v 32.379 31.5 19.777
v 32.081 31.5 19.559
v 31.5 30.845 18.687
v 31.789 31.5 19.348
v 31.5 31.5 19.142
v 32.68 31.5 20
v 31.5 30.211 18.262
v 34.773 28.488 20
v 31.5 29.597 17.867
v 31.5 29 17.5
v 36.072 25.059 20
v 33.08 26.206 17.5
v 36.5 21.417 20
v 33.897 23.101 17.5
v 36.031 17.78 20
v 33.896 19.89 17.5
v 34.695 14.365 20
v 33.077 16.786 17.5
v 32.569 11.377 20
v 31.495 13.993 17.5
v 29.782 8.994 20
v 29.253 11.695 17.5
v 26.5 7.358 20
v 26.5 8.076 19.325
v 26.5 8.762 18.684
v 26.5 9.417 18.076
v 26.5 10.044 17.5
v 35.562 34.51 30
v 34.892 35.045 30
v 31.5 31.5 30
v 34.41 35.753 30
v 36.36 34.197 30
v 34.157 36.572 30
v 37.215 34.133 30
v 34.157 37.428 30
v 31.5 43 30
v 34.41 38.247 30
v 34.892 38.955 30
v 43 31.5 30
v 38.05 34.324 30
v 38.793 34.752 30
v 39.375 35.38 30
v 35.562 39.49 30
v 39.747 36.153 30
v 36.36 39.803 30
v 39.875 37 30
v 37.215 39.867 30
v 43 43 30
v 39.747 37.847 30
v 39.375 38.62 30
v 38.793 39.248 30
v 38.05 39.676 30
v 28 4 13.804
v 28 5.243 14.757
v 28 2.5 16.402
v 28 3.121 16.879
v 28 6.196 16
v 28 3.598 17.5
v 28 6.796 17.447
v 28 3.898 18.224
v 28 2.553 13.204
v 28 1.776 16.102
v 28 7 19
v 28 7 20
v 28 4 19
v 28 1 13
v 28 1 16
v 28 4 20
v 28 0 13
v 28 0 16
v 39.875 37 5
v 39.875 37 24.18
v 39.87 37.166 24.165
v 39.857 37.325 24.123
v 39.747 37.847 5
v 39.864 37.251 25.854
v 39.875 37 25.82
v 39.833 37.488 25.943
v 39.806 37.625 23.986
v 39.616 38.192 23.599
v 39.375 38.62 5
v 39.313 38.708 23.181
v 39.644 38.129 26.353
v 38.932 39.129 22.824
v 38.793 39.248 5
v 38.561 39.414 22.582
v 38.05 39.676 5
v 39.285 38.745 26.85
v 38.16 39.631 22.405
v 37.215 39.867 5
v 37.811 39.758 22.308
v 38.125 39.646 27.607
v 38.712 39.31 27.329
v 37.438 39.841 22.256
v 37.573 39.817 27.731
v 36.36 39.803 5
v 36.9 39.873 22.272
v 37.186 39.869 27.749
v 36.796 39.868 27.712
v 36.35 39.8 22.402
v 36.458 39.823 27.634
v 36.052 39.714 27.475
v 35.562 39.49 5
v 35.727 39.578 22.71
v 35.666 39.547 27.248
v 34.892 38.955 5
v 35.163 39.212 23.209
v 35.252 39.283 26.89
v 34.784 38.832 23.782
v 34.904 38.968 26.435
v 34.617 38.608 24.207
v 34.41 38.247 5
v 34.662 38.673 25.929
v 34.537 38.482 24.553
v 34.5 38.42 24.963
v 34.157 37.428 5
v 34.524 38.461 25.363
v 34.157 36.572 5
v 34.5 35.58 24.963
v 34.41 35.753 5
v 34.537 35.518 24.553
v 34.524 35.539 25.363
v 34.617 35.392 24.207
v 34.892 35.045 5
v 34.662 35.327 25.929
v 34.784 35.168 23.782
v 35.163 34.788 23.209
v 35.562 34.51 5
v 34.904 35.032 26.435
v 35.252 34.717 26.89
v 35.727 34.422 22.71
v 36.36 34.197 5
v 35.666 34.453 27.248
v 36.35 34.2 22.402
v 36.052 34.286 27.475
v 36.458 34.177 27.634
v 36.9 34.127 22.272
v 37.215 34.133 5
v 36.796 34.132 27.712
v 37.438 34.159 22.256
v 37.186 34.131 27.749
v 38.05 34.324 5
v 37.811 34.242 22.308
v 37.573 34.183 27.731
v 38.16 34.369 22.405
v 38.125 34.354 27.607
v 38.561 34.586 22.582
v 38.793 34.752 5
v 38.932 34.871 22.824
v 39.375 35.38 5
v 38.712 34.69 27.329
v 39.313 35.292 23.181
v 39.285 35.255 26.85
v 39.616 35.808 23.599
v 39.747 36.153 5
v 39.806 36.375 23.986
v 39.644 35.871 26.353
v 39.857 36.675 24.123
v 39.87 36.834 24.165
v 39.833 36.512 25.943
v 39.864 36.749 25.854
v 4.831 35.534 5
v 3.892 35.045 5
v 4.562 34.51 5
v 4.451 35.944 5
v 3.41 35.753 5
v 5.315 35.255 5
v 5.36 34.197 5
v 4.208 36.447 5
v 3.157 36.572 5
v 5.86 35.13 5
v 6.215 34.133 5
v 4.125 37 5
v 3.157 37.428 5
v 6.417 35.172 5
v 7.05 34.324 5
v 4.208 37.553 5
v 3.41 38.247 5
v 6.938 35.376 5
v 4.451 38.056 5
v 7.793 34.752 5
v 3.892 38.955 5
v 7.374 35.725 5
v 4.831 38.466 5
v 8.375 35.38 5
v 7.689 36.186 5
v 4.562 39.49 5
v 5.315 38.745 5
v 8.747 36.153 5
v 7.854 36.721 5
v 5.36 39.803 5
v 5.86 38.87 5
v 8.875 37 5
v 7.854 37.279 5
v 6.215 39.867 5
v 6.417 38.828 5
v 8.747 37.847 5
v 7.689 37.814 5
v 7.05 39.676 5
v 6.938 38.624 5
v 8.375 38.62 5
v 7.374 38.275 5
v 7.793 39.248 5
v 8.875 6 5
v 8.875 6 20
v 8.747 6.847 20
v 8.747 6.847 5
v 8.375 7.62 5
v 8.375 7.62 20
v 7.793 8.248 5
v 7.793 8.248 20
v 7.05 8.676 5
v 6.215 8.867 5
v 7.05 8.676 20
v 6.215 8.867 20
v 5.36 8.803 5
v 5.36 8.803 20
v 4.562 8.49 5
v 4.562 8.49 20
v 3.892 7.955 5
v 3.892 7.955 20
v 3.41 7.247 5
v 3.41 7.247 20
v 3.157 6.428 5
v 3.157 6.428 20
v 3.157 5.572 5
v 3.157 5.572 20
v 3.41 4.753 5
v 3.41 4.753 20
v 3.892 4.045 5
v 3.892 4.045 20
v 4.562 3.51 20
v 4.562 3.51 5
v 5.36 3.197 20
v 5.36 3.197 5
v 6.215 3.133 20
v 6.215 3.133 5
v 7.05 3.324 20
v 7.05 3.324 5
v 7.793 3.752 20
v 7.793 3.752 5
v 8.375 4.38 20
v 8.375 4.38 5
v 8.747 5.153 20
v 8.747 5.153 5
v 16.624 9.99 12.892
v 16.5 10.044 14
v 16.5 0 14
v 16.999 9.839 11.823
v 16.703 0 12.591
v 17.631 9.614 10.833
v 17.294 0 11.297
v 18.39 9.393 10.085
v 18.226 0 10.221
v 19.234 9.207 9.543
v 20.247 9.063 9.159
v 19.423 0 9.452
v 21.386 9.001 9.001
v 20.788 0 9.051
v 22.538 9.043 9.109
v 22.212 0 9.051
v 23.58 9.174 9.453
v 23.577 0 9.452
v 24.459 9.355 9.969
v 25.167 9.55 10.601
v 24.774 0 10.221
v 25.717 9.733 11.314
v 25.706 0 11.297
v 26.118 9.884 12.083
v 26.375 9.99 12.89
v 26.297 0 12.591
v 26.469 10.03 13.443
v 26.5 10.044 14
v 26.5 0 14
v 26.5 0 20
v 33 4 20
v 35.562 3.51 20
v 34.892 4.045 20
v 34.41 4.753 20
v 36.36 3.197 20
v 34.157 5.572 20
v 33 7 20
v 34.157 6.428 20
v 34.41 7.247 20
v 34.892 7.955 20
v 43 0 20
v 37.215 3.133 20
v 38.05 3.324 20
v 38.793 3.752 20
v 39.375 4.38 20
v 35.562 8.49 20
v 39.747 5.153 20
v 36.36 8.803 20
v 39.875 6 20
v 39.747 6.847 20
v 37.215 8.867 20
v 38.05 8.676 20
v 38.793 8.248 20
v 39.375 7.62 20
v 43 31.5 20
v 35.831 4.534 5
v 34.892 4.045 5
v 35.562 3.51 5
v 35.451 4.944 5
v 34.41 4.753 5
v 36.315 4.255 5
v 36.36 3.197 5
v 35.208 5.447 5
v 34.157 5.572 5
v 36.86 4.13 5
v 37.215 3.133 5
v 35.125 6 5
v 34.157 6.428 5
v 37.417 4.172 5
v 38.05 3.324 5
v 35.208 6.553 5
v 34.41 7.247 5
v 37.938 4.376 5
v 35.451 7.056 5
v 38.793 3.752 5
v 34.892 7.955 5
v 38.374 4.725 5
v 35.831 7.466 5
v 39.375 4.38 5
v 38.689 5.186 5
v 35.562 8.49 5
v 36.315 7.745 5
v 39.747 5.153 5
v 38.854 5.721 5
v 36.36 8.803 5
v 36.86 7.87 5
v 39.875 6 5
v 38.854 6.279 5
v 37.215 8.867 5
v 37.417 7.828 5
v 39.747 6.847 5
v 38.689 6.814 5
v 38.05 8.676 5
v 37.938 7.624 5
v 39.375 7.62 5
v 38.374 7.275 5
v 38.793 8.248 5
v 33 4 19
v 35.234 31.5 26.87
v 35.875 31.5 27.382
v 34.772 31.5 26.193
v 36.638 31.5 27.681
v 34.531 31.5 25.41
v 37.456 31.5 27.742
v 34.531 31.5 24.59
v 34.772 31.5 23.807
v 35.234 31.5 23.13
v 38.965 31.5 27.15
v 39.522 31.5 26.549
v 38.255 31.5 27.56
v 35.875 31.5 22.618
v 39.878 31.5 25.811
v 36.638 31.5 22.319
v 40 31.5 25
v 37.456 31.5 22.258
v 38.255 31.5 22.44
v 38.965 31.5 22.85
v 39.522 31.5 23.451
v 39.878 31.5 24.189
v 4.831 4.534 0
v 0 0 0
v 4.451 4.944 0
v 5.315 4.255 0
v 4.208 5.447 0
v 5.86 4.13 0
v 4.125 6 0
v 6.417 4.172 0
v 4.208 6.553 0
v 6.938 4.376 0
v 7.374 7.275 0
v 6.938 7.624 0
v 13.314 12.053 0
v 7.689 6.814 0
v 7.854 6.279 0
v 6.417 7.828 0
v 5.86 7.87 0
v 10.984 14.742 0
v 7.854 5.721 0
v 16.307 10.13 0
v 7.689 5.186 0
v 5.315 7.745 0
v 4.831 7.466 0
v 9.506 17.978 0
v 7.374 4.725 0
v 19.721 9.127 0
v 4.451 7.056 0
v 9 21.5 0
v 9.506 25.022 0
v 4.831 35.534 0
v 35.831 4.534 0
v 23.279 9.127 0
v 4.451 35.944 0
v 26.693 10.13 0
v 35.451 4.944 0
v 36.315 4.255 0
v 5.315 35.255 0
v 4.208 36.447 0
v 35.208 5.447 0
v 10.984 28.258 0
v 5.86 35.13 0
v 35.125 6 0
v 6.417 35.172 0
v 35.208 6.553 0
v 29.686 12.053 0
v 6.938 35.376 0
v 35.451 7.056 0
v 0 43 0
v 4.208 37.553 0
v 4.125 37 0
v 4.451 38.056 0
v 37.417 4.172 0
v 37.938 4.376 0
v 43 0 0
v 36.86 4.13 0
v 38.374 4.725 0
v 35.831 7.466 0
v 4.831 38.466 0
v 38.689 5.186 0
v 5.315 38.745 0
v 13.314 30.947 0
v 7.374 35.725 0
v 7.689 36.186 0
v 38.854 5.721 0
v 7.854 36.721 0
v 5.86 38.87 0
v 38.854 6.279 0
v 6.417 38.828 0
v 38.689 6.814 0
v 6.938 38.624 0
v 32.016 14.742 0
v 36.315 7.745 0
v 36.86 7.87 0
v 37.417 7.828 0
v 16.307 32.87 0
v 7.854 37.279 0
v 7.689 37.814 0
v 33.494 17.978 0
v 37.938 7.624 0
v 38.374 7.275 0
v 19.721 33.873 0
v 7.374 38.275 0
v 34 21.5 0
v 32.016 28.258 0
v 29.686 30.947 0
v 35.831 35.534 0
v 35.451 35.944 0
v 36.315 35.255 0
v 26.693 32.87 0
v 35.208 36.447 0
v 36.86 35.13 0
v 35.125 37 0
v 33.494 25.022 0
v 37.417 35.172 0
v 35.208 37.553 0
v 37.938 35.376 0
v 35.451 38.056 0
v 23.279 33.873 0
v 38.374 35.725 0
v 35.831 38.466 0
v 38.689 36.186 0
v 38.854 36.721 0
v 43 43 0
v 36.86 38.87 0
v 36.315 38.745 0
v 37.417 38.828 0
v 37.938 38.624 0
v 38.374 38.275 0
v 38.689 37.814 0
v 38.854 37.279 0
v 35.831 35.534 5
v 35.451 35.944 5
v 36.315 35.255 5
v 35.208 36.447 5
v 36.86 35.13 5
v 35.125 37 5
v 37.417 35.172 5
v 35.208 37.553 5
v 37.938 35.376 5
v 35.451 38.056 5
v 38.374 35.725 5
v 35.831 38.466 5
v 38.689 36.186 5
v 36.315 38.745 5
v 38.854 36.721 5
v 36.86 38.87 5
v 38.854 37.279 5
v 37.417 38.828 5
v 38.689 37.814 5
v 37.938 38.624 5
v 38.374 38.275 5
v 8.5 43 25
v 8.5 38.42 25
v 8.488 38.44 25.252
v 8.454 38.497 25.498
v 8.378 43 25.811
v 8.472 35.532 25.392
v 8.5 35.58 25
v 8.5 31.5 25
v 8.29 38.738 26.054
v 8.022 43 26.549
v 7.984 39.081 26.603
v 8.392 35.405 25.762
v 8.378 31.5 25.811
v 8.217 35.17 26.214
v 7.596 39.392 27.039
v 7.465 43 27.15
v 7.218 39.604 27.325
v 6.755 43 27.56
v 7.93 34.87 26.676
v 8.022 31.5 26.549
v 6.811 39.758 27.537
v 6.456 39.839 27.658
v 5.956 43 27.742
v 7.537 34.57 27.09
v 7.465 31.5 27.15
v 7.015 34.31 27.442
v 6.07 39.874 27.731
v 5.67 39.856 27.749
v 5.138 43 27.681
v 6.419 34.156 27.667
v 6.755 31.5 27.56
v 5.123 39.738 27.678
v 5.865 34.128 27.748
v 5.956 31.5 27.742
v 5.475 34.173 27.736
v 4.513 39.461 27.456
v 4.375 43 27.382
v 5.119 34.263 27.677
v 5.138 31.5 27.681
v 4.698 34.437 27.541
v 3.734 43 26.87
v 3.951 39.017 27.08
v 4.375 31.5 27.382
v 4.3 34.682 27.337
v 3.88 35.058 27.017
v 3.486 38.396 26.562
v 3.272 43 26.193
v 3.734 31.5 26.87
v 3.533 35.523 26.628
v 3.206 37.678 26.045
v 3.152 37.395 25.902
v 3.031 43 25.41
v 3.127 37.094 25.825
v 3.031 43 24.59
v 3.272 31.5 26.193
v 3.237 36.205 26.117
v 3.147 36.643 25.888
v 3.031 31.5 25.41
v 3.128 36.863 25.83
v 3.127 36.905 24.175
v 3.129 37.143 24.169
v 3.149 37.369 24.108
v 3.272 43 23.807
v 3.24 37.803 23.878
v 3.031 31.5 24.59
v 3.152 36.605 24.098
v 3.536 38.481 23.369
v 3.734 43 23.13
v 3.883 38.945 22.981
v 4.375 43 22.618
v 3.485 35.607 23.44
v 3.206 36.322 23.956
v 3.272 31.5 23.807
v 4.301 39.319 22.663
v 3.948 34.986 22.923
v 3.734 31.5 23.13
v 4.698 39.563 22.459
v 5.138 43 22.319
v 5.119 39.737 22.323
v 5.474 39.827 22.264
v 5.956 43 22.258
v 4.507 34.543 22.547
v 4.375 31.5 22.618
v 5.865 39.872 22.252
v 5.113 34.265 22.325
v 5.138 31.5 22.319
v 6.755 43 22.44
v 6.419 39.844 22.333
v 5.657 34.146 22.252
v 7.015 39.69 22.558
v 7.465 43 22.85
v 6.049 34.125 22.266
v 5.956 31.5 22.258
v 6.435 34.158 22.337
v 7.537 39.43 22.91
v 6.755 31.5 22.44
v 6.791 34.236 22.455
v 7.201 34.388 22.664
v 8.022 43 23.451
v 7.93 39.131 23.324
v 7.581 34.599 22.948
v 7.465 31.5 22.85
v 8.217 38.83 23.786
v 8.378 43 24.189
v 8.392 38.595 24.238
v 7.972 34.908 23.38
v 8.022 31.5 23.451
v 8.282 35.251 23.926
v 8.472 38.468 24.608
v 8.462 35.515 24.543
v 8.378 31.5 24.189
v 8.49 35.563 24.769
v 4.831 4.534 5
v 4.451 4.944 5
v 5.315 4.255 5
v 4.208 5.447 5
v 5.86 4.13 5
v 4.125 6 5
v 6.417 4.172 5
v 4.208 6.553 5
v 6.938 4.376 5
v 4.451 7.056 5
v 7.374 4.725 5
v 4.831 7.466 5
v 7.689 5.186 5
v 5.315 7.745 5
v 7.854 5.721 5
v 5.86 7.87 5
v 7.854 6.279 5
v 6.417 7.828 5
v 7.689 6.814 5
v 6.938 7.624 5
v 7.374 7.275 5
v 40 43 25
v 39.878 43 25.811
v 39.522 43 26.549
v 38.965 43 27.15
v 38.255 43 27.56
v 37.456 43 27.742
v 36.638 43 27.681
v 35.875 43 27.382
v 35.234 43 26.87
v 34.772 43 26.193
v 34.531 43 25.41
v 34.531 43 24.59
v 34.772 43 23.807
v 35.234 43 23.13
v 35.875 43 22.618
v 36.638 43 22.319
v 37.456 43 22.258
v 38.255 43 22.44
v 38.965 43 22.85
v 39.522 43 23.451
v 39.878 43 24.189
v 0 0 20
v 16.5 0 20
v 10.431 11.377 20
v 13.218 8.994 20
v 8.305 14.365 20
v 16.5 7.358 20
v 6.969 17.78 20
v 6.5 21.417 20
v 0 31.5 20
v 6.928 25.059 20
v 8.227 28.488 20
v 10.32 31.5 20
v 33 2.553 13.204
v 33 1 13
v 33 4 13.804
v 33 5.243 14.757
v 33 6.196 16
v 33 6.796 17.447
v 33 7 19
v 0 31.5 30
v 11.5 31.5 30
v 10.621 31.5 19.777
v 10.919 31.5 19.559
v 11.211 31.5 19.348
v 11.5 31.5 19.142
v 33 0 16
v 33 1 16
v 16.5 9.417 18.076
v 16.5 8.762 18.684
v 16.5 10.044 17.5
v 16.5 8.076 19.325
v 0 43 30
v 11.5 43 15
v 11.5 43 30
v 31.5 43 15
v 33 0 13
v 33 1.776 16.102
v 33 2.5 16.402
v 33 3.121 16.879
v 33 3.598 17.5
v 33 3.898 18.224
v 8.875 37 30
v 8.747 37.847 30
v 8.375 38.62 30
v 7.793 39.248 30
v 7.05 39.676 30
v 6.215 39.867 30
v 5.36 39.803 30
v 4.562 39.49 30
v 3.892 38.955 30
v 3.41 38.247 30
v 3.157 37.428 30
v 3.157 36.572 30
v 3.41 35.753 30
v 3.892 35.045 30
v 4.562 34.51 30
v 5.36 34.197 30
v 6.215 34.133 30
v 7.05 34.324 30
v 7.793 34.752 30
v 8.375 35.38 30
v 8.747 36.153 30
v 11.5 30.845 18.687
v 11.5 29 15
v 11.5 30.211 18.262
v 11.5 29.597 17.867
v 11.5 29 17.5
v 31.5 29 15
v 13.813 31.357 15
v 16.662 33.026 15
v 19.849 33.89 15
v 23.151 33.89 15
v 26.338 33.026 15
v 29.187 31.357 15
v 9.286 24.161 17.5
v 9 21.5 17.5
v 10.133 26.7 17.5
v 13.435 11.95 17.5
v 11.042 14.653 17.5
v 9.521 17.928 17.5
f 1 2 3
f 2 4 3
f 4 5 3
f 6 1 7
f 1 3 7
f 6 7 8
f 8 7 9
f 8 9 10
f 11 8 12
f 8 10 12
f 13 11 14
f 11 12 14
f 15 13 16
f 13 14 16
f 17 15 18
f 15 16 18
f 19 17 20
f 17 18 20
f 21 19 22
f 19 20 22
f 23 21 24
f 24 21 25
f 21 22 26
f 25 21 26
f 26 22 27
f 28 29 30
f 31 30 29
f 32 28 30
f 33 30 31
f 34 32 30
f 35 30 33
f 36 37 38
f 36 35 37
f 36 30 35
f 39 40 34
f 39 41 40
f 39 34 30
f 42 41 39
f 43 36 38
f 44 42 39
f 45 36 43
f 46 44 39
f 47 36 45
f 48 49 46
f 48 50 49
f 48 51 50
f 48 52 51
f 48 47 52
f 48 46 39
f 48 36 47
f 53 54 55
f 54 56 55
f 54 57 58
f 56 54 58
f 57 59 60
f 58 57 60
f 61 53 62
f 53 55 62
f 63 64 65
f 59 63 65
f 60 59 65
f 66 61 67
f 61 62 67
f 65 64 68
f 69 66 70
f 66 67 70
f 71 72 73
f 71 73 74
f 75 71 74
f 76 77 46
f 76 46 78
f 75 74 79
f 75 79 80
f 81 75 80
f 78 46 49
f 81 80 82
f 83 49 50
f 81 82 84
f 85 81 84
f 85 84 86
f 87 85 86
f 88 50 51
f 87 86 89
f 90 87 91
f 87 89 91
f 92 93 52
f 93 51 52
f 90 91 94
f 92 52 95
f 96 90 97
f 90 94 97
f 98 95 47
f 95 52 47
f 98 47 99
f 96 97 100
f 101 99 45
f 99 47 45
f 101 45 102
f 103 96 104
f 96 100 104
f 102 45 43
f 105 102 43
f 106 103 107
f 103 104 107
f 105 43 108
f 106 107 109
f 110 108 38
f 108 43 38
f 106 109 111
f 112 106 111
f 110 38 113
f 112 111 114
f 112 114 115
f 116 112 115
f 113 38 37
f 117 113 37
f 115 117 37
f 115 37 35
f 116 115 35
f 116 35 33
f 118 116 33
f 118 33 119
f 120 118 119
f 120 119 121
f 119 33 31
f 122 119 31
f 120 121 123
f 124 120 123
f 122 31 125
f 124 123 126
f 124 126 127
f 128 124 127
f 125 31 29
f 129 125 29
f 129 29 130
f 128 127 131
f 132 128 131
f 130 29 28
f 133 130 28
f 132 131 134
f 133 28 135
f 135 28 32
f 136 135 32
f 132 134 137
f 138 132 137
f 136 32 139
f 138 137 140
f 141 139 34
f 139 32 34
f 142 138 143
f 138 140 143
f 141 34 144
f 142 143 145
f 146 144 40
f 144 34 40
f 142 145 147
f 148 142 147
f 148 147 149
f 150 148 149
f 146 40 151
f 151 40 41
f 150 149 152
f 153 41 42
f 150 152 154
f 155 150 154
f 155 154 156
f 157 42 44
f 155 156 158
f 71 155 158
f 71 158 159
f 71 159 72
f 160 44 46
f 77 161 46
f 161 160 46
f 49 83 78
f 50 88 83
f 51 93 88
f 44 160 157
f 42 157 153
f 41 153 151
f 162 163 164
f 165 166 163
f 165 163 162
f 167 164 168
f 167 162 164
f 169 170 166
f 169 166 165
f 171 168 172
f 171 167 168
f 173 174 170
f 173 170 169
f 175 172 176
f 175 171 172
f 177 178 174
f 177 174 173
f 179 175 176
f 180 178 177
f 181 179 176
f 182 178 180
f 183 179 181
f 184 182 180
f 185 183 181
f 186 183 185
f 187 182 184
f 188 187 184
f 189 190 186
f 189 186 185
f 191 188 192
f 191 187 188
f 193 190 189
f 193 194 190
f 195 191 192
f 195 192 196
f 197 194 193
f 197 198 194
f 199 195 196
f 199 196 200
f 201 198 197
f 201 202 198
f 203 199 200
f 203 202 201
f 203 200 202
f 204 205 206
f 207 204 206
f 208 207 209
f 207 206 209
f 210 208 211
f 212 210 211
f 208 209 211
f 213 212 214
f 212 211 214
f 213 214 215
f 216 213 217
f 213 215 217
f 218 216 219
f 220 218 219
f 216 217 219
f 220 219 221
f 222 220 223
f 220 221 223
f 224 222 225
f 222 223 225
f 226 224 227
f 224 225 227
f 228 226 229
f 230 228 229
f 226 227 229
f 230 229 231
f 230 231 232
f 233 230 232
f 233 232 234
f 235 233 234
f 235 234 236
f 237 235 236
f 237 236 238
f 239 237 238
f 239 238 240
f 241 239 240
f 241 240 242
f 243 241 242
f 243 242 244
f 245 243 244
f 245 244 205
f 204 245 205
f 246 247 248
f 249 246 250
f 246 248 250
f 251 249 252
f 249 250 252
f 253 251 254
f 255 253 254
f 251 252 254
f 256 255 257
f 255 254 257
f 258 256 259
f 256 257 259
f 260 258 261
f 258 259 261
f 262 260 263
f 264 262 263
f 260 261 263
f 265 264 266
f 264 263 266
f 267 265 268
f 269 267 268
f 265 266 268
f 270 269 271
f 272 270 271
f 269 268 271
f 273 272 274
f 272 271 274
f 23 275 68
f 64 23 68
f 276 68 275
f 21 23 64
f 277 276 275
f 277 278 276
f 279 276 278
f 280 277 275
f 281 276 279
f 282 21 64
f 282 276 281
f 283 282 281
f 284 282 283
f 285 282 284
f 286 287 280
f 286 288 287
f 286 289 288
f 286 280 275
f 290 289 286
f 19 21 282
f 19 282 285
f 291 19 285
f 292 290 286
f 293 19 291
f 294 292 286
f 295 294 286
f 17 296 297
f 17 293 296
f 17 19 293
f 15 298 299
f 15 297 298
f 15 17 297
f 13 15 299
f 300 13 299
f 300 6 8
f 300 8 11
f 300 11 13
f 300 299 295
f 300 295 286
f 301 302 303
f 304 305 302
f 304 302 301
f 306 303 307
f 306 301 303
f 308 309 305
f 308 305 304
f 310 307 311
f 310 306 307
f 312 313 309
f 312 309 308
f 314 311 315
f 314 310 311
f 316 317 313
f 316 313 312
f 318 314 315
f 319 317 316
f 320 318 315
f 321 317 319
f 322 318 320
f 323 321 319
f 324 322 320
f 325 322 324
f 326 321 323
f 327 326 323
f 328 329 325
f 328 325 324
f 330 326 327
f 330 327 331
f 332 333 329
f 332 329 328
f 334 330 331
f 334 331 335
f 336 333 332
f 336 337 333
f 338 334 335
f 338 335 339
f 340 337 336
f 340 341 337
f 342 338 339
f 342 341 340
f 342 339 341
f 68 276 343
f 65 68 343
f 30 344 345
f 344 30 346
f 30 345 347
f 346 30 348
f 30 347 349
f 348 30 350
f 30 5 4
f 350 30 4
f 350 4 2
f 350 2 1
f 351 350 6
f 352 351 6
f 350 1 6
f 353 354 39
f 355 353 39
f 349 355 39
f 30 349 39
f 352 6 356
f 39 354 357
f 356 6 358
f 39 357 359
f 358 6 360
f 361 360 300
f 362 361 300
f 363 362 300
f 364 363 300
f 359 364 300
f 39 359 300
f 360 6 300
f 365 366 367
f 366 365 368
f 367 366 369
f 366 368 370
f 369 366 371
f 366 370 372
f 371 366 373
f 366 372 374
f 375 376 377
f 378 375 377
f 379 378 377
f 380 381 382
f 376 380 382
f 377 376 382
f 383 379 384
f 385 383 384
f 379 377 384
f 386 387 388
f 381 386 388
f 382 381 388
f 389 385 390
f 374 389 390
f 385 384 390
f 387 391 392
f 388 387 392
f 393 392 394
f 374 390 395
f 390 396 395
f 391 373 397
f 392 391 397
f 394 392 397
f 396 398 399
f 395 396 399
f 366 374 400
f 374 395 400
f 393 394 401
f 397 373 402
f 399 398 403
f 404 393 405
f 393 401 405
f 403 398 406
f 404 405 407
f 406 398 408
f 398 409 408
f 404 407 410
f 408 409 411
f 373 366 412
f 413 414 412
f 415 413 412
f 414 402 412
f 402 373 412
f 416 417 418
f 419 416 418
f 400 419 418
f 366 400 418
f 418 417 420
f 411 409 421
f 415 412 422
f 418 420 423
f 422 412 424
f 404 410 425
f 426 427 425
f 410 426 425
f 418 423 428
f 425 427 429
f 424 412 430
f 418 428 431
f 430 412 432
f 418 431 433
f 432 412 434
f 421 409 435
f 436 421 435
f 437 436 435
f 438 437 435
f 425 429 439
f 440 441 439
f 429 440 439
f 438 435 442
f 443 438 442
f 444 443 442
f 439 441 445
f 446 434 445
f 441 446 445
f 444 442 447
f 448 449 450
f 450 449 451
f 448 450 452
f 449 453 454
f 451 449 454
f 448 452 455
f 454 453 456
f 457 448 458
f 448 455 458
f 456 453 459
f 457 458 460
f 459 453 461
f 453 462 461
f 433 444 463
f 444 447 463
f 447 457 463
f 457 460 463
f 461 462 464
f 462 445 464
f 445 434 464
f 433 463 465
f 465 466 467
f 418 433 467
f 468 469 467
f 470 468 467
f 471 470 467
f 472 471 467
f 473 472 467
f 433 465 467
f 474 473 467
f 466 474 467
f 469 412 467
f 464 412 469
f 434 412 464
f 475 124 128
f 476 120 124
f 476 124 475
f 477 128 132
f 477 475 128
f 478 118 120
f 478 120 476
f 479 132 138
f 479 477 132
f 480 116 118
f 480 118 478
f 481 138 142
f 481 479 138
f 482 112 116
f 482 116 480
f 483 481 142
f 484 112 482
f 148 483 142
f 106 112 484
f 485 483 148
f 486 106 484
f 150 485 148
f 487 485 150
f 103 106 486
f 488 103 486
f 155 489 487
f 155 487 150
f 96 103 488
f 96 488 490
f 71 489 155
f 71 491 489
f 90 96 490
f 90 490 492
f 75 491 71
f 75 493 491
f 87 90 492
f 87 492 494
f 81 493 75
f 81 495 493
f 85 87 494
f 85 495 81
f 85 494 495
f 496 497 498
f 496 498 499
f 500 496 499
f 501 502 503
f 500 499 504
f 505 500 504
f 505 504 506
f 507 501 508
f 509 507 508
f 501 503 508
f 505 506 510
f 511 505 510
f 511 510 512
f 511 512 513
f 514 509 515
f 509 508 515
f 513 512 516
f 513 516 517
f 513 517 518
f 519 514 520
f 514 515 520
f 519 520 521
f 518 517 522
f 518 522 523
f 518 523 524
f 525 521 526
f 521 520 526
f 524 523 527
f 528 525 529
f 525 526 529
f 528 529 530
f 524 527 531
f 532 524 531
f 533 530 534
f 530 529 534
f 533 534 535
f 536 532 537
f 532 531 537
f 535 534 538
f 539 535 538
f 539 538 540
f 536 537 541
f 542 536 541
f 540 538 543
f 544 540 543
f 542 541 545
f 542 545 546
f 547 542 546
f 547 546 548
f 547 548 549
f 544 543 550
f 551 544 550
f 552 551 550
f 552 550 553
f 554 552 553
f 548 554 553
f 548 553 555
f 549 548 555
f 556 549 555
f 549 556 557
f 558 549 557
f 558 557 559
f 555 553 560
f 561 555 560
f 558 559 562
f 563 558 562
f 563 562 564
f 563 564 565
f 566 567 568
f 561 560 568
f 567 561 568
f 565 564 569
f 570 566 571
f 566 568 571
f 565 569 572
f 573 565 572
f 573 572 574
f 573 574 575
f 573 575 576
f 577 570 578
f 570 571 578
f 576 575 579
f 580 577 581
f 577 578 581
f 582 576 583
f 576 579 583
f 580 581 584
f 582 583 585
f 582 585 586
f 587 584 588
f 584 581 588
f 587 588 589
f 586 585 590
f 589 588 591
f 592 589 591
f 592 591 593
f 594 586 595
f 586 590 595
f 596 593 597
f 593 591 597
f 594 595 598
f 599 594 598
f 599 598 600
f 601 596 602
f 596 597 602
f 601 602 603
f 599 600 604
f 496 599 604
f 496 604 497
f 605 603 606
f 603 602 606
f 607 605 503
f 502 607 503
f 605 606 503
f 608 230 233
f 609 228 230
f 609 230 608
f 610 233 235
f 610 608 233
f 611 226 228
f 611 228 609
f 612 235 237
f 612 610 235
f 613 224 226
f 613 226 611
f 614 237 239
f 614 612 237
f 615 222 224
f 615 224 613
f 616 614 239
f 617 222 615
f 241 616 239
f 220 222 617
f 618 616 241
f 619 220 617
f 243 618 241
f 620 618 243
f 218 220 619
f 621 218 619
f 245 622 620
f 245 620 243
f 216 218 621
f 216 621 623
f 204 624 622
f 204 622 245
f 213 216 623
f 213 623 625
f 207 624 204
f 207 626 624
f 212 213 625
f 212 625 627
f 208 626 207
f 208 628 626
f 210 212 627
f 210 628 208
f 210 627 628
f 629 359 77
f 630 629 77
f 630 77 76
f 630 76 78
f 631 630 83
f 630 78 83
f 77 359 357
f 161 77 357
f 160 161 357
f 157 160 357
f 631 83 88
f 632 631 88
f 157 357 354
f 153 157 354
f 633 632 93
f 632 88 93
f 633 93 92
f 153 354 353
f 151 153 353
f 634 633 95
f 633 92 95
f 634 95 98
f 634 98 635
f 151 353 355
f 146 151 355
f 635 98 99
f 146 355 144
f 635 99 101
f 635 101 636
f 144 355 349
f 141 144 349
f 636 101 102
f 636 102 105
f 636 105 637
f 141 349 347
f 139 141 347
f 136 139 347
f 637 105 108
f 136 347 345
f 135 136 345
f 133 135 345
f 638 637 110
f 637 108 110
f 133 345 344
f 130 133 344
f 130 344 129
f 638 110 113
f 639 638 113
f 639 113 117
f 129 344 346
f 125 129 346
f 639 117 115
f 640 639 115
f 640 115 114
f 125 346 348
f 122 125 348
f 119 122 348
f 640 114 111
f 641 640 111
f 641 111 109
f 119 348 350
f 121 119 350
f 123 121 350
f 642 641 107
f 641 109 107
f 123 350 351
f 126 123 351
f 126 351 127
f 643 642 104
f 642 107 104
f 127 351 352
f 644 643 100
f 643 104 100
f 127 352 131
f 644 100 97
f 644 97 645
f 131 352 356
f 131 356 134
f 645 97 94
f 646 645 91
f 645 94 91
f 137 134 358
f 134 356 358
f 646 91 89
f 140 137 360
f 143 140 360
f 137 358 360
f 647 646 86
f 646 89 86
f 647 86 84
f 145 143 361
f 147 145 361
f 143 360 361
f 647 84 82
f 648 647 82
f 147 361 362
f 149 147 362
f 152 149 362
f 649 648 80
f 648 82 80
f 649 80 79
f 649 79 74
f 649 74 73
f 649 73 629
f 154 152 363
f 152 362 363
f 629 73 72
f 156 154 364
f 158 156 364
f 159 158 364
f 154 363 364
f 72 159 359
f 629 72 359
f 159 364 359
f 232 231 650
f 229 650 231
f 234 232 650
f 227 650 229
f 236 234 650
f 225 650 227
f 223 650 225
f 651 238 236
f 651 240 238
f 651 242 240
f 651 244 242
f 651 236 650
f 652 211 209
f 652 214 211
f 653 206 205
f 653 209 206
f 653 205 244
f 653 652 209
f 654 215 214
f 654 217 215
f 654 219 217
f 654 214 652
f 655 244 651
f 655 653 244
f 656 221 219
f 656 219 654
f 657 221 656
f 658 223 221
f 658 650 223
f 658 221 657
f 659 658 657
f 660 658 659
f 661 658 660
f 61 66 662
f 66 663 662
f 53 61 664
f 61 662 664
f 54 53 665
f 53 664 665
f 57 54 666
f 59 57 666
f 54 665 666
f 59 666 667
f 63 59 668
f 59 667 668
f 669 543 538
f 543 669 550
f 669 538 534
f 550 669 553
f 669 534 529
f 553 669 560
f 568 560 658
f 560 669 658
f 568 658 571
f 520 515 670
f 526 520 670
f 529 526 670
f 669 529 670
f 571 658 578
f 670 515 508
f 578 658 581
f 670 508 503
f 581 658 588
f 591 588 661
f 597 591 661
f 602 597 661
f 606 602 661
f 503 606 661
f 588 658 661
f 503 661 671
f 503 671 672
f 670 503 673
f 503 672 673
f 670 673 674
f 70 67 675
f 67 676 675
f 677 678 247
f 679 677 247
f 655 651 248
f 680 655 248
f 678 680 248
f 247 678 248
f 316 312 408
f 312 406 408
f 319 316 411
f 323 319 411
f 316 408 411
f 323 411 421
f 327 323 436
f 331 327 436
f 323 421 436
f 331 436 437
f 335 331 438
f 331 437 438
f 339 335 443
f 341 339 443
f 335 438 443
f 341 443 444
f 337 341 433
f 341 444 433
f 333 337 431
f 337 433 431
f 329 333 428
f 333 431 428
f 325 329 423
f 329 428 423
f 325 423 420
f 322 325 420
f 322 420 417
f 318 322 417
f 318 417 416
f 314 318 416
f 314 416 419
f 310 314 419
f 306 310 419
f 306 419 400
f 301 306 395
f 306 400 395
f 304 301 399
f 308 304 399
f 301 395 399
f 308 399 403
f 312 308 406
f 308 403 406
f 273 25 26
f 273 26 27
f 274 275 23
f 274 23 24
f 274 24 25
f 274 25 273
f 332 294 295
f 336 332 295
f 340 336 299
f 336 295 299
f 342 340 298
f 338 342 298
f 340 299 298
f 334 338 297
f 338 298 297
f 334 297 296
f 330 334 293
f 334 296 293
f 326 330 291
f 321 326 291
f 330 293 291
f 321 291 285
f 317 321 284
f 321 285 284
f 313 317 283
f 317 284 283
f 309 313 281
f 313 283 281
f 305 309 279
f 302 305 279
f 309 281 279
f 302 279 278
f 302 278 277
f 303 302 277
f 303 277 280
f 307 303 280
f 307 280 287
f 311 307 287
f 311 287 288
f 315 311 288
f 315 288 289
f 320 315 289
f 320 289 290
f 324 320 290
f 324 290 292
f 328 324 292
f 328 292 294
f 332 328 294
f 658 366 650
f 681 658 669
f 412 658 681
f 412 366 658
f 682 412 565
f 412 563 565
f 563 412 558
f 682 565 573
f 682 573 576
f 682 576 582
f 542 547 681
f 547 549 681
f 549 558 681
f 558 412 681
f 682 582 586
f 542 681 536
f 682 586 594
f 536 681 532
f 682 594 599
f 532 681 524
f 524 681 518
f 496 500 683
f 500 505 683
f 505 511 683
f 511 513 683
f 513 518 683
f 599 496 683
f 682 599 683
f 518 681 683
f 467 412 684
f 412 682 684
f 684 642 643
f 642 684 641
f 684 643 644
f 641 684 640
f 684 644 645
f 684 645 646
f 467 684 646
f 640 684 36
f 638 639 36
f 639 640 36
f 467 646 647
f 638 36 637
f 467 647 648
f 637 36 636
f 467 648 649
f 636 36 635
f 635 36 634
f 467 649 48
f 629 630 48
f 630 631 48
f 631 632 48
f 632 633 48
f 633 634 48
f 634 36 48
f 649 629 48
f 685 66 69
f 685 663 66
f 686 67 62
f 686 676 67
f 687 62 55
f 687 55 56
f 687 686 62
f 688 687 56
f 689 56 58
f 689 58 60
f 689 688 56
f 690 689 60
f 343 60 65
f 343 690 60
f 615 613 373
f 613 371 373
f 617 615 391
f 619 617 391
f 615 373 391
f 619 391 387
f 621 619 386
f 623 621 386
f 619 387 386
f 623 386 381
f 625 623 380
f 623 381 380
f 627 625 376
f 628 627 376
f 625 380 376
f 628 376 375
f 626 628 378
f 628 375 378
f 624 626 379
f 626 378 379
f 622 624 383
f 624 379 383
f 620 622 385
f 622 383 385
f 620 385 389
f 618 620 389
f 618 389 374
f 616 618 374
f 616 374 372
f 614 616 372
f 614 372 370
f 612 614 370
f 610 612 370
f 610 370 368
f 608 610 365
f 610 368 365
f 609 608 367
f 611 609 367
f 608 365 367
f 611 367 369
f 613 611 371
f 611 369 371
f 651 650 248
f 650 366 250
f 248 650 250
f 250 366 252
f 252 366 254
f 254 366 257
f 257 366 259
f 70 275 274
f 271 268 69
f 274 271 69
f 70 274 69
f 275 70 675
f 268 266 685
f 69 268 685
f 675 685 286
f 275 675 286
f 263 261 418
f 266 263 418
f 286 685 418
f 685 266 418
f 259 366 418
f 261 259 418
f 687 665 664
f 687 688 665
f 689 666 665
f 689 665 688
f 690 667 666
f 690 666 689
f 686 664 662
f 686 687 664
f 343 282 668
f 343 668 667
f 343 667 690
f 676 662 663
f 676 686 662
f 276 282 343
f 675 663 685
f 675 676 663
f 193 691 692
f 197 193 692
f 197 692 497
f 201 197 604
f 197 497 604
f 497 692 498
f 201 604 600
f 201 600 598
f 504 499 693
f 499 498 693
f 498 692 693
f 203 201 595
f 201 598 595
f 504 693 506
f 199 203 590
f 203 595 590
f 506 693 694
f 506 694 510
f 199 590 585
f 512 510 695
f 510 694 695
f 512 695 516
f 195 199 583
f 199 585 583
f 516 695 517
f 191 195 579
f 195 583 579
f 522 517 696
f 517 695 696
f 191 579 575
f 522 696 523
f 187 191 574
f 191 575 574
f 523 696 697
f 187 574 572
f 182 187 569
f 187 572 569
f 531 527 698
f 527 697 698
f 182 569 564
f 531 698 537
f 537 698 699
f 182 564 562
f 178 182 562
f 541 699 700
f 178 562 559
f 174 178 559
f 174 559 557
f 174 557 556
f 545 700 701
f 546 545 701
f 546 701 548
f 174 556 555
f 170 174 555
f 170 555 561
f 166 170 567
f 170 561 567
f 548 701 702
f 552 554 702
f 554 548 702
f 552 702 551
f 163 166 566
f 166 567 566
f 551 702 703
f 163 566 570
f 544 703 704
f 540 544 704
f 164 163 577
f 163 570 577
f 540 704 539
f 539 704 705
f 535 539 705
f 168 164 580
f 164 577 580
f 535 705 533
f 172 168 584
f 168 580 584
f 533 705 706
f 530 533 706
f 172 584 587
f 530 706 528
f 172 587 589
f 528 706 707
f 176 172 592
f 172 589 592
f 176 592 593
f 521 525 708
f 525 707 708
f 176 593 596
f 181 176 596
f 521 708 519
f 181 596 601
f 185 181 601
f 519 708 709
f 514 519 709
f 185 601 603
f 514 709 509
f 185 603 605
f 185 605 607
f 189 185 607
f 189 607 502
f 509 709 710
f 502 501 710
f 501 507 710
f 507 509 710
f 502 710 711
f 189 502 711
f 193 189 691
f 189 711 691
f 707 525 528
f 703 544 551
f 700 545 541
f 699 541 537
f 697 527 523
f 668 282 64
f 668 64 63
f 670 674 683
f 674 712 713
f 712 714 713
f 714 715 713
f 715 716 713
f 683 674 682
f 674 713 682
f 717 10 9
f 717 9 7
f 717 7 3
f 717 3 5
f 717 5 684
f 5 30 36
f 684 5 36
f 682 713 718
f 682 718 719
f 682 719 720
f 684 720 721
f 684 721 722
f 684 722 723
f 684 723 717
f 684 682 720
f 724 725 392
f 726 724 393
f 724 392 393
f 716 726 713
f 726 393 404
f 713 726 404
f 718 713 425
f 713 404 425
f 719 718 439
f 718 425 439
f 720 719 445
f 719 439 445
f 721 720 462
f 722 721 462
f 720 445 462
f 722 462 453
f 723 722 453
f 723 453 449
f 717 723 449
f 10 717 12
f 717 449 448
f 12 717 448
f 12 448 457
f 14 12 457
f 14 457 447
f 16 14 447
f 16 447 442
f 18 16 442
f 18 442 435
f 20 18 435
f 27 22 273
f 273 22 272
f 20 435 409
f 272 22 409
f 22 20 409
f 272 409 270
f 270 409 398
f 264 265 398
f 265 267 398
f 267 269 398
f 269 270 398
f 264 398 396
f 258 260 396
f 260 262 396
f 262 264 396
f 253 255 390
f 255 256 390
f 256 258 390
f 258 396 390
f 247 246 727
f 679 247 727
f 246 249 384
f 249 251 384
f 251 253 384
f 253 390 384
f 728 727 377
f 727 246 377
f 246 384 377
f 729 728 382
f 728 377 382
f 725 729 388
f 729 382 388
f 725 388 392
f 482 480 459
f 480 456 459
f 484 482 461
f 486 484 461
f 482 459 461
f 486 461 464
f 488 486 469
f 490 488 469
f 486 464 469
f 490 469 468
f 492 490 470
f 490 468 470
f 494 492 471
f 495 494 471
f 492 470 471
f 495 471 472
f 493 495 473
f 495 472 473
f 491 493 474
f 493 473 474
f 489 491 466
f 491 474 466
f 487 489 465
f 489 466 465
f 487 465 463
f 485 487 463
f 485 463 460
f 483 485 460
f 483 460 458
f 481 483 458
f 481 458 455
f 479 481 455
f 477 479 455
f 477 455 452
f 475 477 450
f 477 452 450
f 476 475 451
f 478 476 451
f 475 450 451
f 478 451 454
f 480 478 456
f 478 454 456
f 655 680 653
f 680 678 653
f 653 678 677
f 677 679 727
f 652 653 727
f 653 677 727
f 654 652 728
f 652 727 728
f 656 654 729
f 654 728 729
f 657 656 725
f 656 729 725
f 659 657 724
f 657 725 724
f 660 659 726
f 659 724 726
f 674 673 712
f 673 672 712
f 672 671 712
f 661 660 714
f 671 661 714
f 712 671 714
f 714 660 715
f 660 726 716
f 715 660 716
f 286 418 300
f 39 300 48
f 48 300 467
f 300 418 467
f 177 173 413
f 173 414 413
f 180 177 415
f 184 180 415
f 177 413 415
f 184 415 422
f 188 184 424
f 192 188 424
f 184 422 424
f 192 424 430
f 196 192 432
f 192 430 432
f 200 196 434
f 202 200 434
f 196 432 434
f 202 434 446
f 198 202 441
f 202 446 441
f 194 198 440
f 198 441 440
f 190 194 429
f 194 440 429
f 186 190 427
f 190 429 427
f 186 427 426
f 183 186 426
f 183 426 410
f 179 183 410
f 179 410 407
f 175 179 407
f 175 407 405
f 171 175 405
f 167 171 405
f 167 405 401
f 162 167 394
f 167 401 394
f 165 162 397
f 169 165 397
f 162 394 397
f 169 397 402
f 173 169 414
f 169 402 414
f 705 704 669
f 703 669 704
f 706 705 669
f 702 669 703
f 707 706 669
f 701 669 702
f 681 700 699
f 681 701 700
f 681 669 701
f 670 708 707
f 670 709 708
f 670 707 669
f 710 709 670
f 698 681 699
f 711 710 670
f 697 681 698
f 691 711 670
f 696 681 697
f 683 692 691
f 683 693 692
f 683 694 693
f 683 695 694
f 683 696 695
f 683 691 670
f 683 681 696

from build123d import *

# Parameters (mm, degrees)
SKETCH_W            = 43
SKETCH_H            = 43
PAD_DEPTH           = 20
HOLE_D              = 3.75
HOLE_CBORE_D        = 5.75
HOLE_CBORE_DEPTH    = 15
HOLE001_D           = 25
HOLE001_CSINK_D     = 30
HOLE001_CSINK_ANGLE = 90
SKETCH003_W         = 20
SKETCH003_H         = 32.696217
POCKET_DEPTH        = 5
POCKET001_DEPTH     = 25
SKETCH005_W         = 11.5
SKETCH005_H         = 11.5
PAD001_DEPTH        = 10
PAD001_DEPTH_BACK   = 2
HOLE002_D           = 3.75
HOLE002_CBORE_D     = 5.75
HOLE002_CBORE_DEPTH = 15
SKETCH007_R         = 2.75
HOLE003_DEPTH       = 11.501
POCKET002_DEPTH     = 2.5


with BuildPart() as part:
    # Sketch → Pad (new body)
    with BuildSketch(Plane.XY):
        with Locations((21.5, 21.5)):
            Rectangle(SKETCH_W, SKETCH_H)
    extrude(amount=PAD_DEPTH)

    # Hole (through all)
    with Locations(Plane.XY.offset(20)):
        with Locations((6, 37), (37, 37), (37, 6), (6, 6)):
            CounterBoreHole(HOLE_D / 2, HOLE_CBORE_D / 2, HOLE_CBORE_DEPTH)

    # Hole001 (through all)
    with Locations(Plane.XY.offset(20)):
        with Locations((21.5, 21.5)):
            CounterSinkHole(HOLE001_D / 2, HOLE001_CSINK_D / 2, counter_sink_angle=HOLE001_CSINK_ANGLE)

    # Sketch003 (on Face5 of Hole001) → Pocket (cut)
    with BuildSketch(Plane.XY.offset(20)):
        with Locations((21.5, 34.162118)):
            Rectangle(SKETCH003_W, SKETCH003_H)
    extrude(amount=-POCKET_DEPTH, mode=Mode.SUBTRACT)

    # Sketch004 (on Face1 of Pocket) → Pocket001 (cut)
    with BuildSketch(Plane.XZ):
        with BuildLine():
            ThreePointArc((16.5, 14), (21.5, 9), (26.5, 14))
            Line((26.5, 20), (26.5, 14))
            Line((16.5, 20), (26.5, 20))
            Line((16.5, 20), (16.5, 14))
        make_face()
    extrude(amount=-POCKET001_DEPTH, mode=Mode.SUBTRACT)

    # Sketch005 (on Face8 of Pocket001) → Pad001 (join, two sides)
    with BuildSketch(Plane.XY.offset(20)) as pad001_sk:
        with Locations((5.75, 37.25)):
            Rectangle(SKETCH005_W, SKETCH005_H)
        with Locations((37.25, 37.25)):
            Rectangle(SKETCH005_W, SKETCH005_H)
    extrude(amount=PAD001_DEPTH)
    extrude(pad001_sk.sketch, amount=-PAD001_DEPTH_BACK)

    # Hole002 (through all)
    with Locations(Plane.XY.offset(30)):
        with Locations((6, 37), (37, 37)):
            CounterBoreHole(HOLE002_D / 2, HOLE002_CBORE_D / 2, HOLE002_CBORE_DEPTH)

    # Sketch007 (on Face22 of Hole002) → Hole003 (cut, through all)
    with BuildSketch(Plane.XZ.offset(-31.5)):
        with Locations((5.75, 25)):
            Circle(SKETCH007_R)
        with Locations((37.25, 25)):
            Circle(SKETCH007_R)
    extrude(amount=-HOLE003_DEPTH, mode=Mode.SUBTRACT)

    # Sketch008 → Pocket002 (cut, symmetric)
    with BuildSketch(Plane.YZ.offset(30.5)):
        with BuildLine():
            Line((7, 20), (7, 19))
            ThreePointArc((1, 13), (5.242641, 14.757359), (7, 19))
            Line((1, 13), (0, 13))
            Line((0, 16), (0, 13))
            Line((1, 16), (0, 16))
            ThreePointArc((1, 16), (3.12132, 16.87868), (4, 19))
            Line((4, 20), (4, 19))
            Line((4, 20), (7, 20))
        make_face()
    extrude(amount=POCKET002_DEPTH, both=True, mode=Mode.SUBTRACT)


solid = part.part
